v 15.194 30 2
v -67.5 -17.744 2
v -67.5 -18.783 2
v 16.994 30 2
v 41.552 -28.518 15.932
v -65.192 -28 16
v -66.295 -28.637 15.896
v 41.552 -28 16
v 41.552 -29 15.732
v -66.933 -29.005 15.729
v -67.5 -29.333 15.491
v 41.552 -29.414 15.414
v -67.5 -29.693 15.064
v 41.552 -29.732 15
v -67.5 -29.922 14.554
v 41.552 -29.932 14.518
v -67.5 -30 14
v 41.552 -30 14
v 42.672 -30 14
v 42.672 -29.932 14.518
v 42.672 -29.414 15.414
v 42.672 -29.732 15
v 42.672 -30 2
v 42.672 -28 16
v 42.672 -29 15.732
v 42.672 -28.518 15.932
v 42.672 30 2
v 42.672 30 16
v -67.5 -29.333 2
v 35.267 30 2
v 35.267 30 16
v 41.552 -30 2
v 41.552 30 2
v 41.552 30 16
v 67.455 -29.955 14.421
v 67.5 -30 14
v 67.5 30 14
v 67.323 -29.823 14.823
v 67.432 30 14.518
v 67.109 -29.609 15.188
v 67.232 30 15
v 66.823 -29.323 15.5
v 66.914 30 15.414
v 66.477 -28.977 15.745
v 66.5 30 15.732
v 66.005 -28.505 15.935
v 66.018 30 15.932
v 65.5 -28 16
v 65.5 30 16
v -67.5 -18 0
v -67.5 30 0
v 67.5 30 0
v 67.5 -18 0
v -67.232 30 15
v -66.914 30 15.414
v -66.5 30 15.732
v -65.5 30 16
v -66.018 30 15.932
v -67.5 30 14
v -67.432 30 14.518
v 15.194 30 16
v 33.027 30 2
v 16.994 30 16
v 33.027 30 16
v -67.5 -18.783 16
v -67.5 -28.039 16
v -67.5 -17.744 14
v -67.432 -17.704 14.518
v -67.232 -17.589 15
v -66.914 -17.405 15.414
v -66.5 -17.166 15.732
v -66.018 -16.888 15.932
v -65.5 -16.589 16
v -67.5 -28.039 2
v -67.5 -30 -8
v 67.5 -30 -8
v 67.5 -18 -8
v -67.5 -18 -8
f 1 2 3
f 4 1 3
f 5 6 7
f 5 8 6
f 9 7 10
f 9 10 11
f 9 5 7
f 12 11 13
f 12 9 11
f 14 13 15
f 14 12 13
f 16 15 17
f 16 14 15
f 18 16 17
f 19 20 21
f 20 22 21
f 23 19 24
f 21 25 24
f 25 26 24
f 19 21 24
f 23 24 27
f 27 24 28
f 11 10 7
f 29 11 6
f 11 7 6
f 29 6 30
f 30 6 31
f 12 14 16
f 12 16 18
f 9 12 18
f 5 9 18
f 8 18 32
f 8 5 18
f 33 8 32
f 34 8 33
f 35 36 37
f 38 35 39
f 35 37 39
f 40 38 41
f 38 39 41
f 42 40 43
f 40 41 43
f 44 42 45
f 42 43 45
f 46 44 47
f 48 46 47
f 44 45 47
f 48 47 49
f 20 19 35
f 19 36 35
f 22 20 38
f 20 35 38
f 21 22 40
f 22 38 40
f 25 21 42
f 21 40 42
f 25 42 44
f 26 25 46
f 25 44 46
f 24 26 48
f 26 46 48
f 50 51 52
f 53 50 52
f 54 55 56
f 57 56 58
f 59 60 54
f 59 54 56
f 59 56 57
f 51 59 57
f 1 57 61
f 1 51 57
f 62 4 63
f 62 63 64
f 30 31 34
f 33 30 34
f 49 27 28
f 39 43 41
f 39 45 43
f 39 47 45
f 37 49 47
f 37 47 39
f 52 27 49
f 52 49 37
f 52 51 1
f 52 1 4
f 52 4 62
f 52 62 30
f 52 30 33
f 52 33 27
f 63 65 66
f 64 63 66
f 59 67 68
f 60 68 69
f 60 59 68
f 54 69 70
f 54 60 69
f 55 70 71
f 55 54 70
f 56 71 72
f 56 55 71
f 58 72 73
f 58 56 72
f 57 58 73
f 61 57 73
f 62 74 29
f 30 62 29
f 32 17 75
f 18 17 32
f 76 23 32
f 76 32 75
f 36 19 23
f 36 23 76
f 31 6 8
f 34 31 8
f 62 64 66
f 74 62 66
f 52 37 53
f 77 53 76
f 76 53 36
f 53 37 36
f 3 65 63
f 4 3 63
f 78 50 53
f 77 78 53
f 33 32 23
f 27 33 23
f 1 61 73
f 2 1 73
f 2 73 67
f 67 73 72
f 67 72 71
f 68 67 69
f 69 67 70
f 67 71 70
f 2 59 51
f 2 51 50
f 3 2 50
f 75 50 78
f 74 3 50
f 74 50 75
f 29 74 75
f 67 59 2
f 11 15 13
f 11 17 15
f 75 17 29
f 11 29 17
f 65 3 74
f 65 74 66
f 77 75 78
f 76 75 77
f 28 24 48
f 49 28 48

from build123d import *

# Parameters (mm, degrees)
F0_W     = 135
F0_H     = 60
F1_DEPTH = 16
F2_W     = 1.12
F2_H     = 60
F3_DEPTH = 14
F4_R     = 2
F5_W     = 135
F5_H     = 12
F6_DEPTH = 8


with BuildPart() as f1:
    # F0 (on Top) → F1 (new body)
    with BuildSketch(Plane.XY):
        Rectangle(F0_W, F0_H)
    extrude(amount=F1_DEPTH)

    # F2 (on face) → F3 (cut)
    with BuildSketch(Plane.XY.offset(16)):
        Polygon((16.9943201199, 30), (15.1943201199, 30), (-67.5, -17.7435879817), (-67.5, -18.7828184662), align=None)
        Polygon((35.2673136497, 30), (33.0273136497, 30), (-67.5, -28.0394715965), (-67.5, -29.3327361995), align=None)
        with Locations((42.1117129004, 0)):
            Rectangle(F2_W, F2_H)
    extrude(amount=-F3_DEPTH, mode=Mode.SUBTRACT)

    # F4
    f4_edges = [f1.edges().sort_by_distance(p)[0] for p in [
        (-12.974144, -30, 16),
        (-67.5, 6.128206, 16),
        (67.5, 0, 16),
        (55.085856, -30, 16),
    ]]
    fillet(f4_edges, radius=F4_R)

    # F5 (on face) → F6 (join)
    with BuildSketch(Plane(origin=(0, 0, 0), x_dir=(1, 0, 0), z_dir=(0, 0, -1))):
        with Locations((0, 24)):
            Rectangle(F5_W, F5_H)
    extrude(amount=F6_DEPTH)


solid = f1.part
